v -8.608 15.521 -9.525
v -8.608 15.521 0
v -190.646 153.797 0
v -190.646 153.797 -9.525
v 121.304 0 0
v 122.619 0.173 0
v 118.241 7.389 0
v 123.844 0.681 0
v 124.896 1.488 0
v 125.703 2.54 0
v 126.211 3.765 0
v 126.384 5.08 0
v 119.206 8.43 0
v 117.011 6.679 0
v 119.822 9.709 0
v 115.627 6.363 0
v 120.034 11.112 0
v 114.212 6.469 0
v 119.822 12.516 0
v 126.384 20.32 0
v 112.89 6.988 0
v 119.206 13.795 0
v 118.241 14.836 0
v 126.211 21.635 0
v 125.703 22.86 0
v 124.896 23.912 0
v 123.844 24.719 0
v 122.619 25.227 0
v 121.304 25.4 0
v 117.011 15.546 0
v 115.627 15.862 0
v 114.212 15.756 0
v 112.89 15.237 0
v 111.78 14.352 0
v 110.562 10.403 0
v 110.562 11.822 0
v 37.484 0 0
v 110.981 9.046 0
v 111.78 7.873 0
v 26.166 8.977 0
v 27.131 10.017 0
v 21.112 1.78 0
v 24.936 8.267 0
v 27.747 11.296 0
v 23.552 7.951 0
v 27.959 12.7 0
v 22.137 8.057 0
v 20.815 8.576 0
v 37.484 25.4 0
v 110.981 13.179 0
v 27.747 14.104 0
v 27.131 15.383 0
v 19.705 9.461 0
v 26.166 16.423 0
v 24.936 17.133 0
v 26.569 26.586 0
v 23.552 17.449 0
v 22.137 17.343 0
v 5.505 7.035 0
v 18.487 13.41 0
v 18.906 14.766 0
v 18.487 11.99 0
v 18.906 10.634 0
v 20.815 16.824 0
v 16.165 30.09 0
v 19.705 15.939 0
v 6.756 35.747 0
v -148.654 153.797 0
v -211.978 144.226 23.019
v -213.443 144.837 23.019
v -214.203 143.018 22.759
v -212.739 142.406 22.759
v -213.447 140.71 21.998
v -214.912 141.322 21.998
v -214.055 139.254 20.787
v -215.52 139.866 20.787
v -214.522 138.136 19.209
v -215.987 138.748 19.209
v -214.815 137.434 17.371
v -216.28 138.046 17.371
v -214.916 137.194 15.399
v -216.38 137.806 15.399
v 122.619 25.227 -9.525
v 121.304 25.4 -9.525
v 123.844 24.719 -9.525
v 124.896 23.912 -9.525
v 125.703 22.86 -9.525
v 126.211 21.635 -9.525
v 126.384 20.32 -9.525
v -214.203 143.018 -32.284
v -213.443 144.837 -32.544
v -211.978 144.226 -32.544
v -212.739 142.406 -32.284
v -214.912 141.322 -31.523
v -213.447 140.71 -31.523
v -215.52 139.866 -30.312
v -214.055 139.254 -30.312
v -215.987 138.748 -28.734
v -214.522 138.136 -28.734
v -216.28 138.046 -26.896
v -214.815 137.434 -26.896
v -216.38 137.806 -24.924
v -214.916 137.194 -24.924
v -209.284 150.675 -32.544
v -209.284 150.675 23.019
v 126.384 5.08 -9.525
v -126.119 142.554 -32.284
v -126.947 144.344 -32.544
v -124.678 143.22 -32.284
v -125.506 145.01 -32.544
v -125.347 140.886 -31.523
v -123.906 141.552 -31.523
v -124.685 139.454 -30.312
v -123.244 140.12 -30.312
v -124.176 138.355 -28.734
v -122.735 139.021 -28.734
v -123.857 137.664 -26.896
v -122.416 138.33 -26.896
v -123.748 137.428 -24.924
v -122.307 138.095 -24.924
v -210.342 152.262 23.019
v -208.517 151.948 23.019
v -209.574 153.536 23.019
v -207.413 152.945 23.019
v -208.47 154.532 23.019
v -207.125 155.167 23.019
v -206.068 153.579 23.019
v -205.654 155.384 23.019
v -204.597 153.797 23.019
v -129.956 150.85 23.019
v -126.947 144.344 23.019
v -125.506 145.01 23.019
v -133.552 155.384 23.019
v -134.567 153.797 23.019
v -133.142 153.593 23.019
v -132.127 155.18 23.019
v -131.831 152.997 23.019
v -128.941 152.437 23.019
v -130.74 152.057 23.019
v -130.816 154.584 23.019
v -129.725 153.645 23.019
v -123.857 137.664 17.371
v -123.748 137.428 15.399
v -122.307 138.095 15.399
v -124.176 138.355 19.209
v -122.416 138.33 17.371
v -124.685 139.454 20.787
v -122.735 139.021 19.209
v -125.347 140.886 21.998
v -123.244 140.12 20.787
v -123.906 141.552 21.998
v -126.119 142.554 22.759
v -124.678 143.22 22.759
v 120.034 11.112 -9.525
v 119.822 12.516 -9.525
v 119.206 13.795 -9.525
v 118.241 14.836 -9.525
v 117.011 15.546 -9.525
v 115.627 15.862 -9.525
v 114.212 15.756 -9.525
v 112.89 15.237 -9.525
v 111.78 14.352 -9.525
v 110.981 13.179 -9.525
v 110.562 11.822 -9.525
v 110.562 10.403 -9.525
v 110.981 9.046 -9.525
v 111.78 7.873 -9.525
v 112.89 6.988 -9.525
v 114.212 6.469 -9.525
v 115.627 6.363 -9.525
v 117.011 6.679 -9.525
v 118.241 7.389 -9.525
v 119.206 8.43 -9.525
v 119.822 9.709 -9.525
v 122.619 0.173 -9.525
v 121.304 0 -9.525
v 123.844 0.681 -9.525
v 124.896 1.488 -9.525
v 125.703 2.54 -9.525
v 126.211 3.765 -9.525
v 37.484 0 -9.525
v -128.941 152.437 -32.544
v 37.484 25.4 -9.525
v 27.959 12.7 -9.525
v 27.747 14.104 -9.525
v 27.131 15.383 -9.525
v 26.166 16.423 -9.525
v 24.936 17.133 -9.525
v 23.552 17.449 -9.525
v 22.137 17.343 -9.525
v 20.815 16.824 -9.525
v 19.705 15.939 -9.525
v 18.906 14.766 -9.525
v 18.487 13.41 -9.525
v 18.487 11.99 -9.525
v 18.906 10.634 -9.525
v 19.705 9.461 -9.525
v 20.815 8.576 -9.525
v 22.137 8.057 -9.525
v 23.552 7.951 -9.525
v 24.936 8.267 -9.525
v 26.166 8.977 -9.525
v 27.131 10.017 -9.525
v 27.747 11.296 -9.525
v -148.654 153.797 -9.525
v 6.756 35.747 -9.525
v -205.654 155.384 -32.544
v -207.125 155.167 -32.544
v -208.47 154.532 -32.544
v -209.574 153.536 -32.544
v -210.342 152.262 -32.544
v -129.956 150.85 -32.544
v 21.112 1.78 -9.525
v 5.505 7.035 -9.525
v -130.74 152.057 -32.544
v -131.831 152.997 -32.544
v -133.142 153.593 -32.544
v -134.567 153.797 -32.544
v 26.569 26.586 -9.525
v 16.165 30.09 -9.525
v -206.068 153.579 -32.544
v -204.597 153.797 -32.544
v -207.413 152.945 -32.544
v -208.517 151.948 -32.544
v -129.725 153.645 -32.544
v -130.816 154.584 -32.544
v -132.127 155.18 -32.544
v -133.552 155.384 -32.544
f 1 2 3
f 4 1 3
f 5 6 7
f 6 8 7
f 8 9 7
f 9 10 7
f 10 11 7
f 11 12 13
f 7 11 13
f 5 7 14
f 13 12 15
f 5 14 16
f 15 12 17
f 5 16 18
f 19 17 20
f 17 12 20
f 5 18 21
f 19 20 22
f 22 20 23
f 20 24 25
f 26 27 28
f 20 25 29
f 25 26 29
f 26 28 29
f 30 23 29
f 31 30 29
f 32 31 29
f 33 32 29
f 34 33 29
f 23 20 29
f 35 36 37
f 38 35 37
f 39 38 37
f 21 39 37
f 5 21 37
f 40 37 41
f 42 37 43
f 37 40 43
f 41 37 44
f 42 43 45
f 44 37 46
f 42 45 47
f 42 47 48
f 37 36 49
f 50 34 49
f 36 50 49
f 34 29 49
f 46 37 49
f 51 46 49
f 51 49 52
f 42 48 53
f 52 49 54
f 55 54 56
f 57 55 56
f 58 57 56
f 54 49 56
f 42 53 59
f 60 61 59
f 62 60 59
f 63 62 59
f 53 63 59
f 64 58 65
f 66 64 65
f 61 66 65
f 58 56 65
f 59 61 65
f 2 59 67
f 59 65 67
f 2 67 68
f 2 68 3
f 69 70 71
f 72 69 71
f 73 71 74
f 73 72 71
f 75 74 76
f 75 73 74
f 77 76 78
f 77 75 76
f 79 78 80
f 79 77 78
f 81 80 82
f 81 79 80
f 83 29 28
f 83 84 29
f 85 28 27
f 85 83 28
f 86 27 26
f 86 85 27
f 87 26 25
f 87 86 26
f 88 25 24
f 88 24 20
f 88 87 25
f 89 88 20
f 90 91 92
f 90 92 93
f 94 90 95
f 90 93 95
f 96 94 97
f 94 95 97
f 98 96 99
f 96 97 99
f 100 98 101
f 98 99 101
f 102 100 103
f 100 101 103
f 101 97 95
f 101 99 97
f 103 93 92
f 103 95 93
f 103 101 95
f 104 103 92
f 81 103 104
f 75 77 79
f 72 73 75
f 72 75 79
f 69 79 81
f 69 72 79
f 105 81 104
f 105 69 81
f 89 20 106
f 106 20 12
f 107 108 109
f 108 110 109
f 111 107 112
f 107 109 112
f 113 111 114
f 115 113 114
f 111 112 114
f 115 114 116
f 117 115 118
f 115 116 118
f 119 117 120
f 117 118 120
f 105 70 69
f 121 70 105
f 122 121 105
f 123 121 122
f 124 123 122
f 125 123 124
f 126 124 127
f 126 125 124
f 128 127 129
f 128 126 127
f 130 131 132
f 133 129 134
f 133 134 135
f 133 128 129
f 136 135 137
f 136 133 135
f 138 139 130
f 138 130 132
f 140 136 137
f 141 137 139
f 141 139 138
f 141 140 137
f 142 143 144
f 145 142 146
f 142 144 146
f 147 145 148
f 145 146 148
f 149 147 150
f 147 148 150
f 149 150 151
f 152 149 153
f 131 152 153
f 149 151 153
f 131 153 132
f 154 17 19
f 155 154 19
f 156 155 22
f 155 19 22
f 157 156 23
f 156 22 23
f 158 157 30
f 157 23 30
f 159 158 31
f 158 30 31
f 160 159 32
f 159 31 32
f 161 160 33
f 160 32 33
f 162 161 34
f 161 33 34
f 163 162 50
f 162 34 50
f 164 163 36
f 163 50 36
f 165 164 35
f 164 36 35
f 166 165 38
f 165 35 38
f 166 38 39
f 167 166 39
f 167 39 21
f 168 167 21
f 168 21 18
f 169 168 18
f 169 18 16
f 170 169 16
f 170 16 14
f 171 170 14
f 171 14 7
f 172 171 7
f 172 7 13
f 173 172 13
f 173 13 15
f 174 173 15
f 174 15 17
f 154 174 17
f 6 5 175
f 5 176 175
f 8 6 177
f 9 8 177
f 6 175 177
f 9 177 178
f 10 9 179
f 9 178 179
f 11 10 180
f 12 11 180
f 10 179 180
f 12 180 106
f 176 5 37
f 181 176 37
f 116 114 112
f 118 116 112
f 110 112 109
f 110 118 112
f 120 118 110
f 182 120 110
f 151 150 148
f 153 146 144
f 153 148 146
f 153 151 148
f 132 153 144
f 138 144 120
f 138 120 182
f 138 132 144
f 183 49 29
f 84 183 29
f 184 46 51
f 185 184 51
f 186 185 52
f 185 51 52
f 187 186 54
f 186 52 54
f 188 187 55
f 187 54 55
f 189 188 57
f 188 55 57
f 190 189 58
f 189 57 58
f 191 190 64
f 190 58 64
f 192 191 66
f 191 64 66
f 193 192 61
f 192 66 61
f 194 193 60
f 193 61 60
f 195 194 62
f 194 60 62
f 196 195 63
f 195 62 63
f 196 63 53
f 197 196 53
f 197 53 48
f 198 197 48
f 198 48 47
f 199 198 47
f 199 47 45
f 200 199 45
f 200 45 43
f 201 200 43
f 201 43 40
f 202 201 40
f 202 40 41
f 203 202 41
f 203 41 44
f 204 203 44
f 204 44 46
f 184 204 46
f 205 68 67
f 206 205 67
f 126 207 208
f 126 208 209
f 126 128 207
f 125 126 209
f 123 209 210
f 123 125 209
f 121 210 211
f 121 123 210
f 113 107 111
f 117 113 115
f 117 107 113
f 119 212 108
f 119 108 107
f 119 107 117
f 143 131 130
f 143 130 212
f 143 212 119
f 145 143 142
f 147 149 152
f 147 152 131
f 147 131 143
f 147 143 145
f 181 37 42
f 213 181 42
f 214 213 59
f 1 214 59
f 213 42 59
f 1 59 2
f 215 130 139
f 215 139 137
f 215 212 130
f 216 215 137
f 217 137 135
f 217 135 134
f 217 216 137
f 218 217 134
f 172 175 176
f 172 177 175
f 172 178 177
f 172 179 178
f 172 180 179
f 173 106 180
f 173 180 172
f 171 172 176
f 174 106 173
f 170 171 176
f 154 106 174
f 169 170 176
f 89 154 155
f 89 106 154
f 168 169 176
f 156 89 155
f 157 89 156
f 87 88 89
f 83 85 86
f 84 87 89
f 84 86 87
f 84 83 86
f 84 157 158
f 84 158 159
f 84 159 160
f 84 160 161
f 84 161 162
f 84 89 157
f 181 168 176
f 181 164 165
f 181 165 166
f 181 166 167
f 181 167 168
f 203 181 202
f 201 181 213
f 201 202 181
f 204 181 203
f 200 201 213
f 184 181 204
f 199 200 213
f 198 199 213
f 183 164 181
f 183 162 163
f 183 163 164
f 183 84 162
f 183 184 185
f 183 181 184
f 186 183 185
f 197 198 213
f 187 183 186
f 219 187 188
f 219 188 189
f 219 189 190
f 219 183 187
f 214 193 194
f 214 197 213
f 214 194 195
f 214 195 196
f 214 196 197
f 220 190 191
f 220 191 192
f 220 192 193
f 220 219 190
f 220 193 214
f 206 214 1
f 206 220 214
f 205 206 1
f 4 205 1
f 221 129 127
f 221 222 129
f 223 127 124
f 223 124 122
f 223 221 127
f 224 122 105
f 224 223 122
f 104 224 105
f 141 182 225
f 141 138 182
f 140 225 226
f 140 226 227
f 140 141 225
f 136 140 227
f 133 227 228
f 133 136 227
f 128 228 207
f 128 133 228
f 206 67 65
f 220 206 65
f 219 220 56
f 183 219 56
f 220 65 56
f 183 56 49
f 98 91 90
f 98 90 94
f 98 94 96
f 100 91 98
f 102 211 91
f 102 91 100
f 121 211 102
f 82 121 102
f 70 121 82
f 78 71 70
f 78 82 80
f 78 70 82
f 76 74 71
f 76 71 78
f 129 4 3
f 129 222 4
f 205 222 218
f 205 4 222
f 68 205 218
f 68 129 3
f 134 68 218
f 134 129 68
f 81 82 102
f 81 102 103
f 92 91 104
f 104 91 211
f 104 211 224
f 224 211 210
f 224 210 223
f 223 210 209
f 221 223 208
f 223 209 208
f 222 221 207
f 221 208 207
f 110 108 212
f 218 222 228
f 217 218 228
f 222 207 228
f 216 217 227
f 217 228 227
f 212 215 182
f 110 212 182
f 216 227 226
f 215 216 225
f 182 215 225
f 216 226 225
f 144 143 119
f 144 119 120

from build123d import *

# Parameters (mm, degrees)
BOSS_EXTRUDE1_DEPTH = 9.525
FILLET1_R           = 5.08
SKETCH2_R           = 4.7625
CUT_EXTRUDE1_DEPTH  = 246.132570215
BOSS_EXTRUDE2_DEPTH = 27.78125
FILLET2_R           = 5.08
FILLET3_R           = 7.62


with BuildPart() as part:
    # Sketch1 → Boss-Extrude1 (new body)
    with BuildSketch(Plane.XY):
        with BuildLine():
            Line((126.383881188, 0), (37.483881188, 0))
            ThreePointArc((37.483881188, 0), (13.166369807, 3.984360141), (-8.608104223, 15.520770598))
            Line((-8.608104223, 15.520770598), (-190.64579243, 153.796726831))
            Line((-190.64579243, 153.796726831), (-148.654110302, 153.796726831))
            Line((-148.654110302, 153.796726831), (6.755890914, 35.747180398))
            ThreePointArc((6.755890914, 35.747180398), (21.272206934, 28.056240094), (37.483881188, 25.4))
            Line((37.483881188, 25.4), (126.383881188, 25.4))
            Line((126.383881188, 25.4), (126.383881188, 0))
        make_face()
    extrude(amount=-BOSS_EXTRUDE1_DEPTH)

    # Fillet1
    fillet1_edges = [part.edges().sort_by_distance(p)[0] for p in [
        (126.383881188, 0, -4.7625),
        (126.383881188, 25.4, -4.7625),
    ]]
    fillet(fillet1_edges, radius=FILLET1_R)

    # Sketch2 → Cut-Extrude1 (cut, through all)
    with BuildSketch(Plane.XY):
        with Locations((115.271381188, 11.1125)):
            Circle(SKETCH2_R)
        with Locations((23.196381188, 12.7)):
            Circle(SKETCH2_R)
    extrude(amount=-CUT_EXTRUDE1_DEPTH, mode=Mode.SUBTRACT)

    # Sketch3 → Boss-Extrude2 (add, symmetric)
    with BuildSketch(Plane.XY.offset(-4.7625)):
        Polygon((-190.64579243, 153.796726831), (-148.654110302, 153.796726831), (-131.319590281, 153.796726831), (-123.747576859, 137.428026377), (-122.306768887, 138.09453117), (-130.304826398, 155.384226831), (-148.654110302, 155.384226831), (-190.64579243, 155.384226831), (-209.037615115, 155.384226831), (-216.380347625, 137.806207053), (-214.915512644, 137.194312678), (-207.980312451, 153.796726831), align=None)
    extrude(amount=BOSS_EXTRUDE2_DEPTH, both=True)

    # Fillet2
    fillet2_edges = [part.edges().sort_by_distance(p)[0] for p in [
        (-207.980312451, 153.796726831, -4.7625),
        (-131.319590281, 153.796726831, -4.7625),
        (-130.304826398, 155.384226831, -4.7625),
        (-209.037615115, 155.384226831, -4.7625),
    ]]
    fillet(fillet2_edges, radius=FILLET2_R)

    # Fillet3
    fillet3_edges = [part.edges().sort_by_distance(p)[0] for p in [
        (-123.027172873, 137.761278773, -32.54375),
        (-215.647930134, 137.500259865, -32.54375),
        (-123.027172873, 137.761278773, 23.01875),
        (-215.647930134, 137.500259865, 23.01875),
    ]]
    fillet(fillet3_edges, radius=FILLET3_R)


solid = part.part
